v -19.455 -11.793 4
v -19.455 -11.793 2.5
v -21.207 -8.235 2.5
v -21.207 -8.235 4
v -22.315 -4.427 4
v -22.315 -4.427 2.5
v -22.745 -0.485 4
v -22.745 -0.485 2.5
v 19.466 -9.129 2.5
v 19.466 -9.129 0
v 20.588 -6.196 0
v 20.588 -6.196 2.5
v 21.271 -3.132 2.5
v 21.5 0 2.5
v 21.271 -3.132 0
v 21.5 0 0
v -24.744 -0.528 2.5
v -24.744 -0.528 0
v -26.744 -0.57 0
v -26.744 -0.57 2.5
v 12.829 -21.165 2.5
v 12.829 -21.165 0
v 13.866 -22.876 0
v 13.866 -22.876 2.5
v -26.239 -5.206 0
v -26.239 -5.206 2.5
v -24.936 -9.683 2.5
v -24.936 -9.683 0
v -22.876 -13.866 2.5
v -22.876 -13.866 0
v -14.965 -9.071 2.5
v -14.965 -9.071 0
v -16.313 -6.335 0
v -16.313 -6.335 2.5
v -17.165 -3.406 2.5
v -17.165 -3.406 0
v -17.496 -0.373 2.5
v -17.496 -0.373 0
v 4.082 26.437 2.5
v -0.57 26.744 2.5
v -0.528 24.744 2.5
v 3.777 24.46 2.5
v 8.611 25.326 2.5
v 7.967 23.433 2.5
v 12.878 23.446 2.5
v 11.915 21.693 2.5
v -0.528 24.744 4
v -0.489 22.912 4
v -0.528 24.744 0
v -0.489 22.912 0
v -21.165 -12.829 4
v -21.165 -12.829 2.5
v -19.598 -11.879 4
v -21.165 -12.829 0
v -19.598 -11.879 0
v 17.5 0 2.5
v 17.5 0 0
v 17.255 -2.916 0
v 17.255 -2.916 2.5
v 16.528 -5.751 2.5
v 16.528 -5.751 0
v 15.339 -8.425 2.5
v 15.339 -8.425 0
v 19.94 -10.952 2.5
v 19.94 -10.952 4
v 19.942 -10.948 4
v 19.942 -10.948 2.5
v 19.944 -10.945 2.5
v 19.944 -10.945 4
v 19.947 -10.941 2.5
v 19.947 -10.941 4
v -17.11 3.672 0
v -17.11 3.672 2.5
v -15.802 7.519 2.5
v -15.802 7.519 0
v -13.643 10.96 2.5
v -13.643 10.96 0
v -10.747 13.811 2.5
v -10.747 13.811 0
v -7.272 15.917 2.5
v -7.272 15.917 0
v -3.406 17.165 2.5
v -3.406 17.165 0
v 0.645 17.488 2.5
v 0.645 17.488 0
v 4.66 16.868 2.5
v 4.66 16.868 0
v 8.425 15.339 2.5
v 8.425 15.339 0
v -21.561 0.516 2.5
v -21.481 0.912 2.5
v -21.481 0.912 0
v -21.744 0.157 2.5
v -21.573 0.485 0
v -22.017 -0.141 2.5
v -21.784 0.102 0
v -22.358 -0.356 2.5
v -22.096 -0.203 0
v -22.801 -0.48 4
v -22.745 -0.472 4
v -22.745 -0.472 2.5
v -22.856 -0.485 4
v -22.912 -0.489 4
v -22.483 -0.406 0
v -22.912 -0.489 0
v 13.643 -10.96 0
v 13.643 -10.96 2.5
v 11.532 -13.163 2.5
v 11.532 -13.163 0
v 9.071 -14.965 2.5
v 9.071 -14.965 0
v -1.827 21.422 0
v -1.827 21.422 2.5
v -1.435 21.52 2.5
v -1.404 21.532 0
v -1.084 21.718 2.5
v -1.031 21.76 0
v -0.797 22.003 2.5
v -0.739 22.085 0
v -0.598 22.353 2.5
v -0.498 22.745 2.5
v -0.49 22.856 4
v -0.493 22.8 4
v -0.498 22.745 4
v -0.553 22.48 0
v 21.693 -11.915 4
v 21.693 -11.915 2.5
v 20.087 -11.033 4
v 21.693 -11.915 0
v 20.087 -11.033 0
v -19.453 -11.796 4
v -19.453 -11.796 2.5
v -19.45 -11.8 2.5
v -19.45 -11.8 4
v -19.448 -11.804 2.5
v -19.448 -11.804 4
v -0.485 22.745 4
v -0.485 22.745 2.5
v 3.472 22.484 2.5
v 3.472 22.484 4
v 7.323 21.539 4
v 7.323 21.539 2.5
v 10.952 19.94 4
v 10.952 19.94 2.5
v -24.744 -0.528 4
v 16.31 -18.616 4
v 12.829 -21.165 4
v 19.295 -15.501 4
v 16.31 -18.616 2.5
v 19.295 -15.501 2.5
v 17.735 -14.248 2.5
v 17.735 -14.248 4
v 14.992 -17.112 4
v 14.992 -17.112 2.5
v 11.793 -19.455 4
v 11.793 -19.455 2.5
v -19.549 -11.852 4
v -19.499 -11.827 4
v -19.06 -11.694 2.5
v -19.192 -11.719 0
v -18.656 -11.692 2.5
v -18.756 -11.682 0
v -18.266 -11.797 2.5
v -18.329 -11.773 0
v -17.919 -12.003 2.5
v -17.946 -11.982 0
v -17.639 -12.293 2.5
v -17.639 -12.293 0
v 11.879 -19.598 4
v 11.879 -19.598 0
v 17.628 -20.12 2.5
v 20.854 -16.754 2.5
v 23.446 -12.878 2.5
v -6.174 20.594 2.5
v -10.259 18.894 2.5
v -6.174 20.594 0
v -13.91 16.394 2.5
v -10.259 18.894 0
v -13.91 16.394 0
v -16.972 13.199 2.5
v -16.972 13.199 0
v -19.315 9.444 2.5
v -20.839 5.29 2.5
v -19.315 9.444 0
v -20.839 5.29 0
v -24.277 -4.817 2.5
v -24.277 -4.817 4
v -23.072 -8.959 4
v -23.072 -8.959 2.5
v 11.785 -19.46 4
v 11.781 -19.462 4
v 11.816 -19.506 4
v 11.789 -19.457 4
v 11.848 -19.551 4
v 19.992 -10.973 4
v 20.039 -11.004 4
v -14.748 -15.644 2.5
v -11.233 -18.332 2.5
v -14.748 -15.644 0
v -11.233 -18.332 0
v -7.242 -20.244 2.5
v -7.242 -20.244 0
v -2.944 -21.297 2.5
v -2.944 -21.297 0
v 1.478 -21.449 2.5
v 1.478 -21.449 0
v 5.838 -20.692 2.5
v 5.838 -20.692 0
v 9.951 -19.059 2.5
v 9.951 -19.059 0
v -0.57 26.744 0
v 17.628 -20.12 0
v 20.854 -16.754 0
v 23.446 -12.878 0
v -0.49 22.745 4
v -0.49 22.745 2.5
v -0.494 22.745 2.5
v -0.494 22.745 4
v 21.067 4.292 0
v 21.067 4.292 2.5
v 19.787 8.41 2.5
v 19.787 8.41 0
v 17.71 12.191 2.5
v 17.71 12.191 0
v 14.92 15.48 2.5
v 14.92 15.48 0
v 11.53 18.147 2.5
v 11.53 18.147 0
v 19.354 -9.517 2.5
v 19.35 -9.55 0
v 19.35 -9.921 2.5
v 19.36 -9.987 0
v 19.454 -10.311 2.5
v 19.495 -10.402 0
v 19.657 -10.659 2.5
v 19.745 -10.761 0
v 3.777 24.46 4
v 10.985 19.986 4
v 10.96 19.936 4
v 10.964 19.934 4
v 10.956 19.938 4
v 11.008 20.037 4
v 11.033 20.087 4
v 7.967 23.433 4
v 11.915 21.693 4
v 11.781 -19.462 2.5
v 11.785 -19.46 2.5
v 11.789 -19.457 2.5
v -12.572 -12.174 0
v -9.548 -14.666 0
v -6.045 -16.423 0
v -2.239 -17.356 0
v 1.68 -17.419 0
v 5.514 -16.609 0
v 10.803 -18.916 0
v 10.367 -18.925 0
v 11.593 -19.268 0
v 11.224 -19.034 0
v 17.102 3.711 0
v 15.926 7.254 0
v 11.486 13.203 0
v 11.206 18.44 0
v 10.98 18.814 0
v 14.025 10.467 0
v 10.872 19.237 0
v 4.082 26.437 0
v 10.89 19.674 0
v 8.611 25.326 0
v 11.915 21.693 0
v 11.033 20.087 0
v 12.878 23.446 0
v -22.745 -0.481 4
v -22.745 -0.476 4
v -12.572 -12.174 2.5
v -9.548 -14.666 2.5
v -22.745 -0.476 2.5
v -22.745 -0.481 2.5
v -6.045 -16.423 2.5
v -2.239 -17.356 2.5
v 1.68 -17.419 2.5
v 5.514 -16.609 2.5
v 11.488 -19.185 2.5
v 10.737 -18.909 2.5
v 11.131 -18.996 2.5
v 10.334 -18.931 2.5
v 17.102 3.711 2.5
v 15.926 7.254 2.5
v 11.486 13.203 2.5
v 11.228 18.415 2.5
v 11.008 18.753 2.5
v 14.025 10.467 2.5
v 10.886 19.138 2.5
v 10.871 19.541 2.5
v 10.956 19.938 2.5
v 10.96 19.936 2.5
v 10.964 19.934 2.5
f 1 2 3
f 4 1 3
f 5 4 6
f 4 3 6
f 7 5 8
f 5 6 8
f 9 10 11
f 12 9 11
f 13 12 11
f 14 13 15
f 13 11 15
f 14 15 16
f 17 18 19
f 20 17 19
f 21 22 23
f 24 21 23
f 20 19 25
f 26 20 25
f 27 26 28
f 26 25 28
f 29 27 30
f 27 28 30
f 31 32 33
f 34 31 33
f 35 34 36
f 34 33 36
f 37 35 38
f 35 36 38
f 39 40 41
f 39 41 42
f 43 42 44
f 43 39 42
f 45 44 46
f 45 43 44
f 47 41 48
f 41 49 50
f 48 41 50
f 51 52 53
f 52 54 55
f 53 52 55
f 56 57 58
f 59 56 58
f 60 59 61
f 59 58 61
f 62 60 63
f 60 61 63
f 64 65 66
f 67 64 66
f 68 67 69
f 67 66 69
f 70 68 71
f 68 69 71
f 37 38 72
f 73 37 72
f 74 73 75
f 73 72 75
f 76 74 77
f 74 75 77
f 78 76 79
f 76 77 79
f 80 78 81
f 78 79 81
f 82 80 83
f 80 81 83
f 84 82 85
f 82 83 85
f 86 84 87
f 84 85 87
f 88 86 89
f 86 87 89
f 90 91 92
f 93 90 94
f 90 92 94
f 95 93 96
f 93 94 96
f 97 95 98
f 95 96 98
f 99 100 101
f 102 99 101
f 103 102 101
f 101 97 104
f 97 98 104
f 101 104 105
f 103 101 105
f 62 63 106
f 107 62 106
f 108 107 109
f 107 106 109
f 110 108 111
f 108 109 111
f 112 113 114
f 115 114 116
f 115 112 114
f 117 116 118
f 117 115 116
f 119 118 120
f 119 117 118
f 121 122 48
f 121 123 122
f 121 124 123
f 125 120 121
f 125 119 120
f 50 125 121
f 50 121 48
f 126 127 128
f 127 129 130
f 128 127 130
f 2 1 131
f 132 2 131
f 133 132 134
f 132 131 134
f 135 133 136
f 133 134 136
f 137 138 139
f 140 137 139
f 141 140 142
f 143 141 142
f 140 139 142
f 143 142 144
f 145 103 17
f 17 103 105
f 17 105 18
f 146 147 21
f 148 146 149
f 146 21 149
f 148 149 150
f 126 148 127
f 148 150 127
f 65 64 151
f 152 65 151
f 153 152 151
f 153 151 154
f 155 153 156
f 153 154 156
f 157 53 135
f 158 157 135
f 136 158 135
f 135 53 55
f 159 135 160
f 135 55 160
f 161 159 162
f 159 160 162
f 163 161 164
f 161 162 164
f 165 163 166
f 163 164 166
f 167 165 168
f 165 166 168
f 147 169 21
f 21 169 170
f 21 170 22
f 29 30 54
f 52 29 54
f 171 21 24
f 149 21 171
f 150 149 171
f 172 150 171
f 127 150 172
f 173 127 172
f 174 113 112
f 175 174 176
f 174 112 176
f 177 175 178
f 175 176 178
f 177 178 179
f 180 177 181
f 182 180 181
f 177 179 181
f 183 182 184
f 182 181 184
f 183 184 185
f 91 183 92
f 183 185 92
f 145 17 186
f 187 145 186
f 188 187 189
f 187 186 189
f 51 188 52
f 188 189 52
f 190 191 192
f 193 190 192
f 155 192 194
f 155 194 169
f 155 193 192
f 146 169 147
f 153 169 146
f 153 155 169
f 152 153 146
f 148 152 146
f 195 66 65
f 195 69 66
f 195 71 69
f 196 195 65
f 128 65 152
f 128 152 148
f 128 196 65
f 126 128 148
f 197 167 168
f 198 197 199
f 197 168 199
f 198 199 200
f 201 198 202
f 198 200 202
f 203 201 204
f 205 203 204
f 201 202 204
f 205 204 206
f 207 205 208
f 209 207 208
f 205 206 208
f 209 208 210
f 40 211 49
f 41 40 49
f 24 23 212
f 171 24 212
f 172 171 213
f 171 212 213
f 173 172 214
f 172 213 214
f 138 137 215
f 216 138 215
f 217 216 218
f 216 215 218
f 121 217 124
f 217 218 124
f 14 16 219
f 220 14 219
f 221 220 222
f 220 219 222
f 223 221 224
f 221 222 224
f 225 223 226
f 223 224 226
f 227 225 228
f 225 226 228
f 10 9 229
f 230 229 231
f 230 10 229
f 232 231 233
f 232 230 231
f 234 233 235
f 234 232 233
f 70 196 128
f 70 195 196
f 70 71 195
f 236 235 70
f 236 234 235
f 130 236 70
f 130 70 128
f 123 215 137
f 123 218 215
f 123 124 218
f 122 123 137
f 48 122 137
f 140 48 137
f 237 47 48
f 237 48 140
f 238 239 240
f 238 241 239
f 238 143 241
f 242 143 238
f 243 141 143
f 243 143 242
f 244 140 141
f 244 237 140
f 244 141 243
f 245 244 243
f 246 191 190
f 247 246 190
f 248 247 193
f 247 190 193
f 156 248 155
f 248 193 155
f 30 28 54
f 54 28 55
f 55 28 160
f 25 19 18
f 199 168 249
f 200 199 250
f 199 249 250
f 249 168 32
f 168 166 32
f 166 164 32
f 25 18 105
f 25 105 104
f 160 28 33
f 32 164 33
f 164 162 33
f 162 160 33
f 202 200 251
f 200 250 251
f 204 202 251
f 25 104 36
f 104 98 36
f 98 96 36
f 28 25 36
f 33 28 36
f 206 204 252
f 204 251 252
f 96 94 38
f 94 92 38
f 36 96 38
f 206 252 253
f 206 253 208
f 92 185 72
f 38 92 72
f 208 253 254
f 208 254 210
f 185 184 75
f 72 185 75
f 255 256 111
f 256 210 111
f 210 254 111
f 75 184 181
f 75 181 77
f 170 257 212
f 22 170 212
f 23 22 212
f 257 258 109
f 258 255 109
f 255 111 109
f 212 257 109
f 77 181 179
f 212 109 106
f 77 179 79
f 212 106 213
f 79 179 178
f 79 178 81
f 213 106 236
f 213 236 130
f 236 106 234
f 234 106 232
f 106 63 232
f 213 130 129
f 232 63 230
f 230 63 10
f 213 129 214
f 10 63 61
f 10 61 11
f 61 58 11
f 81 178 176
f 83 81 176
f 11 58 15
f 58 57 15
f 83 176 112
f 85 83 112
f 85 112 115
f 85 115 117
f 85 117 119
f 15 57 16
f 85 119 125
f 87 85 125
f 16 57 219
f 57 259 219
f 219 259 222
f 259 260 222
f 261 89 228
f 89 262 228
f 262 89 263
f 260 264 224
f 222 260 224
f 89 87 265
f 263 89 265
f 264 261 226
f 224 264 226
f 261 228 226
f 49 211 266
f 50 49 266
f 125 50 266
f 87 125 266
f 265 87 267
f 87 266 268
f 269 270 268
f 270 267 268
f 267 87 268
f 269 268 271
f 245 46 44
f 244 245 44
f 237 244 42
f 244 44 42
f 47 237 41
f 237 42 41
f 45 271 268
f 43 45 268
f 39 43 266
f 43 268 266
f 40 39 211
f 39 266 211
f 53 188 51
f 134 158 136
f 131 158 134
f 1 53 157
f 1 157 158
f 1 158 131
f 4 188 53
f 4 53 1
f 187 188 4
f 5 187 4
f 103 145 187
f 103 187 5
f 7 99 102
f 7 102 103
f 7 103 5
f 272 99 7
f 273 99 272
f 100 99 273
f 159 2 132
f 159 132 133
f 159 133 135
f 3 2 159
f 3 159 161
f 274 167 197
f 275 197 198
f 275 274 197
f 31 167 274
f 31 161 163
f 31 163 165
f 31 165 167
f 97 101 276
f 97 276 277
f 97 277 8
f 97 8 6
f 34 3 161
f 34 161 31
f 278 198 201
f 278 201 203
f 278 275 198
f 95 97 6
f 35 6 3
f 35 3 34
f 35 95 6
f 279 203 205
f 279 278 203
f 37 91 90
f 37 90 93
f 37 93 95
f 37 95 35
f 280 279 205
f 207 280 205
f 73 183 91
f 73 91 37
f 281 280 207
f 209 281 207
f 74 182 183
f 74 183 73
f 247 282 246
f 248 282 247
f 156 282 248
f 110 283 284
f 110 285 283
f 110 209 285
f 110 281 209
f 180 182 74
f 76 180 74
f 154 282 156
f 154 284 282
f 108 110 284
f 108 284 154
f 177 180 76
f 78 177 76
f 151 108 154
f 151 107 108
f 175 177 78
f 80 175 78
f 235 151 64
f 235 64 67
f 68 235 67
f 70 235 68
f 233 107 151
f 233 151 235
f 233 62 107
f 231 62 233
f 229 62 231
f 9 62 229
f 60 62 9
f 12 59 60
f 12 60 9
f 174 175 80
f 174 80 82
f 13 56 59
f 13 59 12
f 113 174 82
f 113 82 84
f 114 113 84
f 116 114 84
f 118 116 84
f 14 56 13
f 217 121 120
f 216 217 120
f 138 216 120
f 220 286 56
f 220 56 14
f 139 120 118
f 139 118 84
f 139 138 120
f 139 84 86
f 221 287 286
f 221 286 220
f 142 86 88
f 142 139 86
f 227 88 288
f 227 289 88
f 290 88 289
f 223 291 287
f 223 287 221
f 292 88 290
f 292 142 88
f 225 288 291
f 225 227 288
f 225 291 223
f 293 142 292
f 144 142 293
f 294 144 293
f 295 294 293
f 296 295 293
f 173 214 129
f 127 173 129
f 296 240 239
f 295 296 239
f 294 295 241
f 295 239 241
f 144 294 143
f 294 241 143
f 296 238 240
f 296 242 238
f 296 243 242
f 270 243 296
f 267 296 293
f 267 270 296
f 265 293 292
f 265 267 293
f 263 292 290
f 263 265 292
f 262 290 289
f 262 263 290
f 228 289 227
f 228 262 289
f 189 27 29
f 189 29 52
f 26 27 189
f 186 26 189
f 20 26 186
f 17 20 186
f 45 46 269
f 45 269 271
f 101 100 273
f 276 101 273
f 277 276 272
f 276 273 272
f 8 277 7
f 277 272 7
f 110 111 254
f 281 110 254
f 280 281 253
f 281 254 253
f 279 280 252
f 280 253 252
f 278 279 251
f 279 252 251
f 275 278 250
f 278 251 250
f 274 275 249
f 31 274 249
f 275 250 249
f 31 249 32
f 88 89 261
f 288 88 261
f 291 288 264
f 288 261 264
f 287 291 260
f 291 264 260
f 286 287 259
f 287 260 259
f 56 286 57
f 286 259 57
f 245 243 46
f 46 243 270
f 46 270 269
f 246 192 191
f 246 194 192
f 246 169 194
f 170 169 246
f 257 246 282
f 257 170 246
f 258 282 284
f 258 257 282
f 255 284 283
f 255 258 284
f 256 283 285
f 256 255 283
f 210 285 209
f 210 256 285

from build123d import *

# Parameters (mm, degrees)
F1_DEPTH     = 4
F2_DEPTH     = 2.5
F3_T3_DEPTH  = 2.5
F3_T6_DEPTH  = 6.1298487604
F3_S8_R      = 22.75
F3_T9_DEPTH  = 5
F3_T12_DEPTH = 2.5
F3_T15_DEPTH = 6.1298487604
F3_S16_R     = 22.75
F3_T17_DEPTH = 5
F3_T21_DEPTH = 2.5
F3_T24_DEPTH = 6.1298487604
F3_S25_R     = 22.75
F3_T26_DEPTH = 5
F3_T30_DEPTH = 2.5
F3_T33_DEPTH = 6.1298487604
F3_S35_R     = 22.75
F3_T36_DEPTH = 5
F3_T39_DEPTH = 2.5
F3_T42_DEPTH = 6.1298487604
F3_S44_R     = 22.75
F3_T45_DEPTH = 5
F3_T48_DEPTH = 2.5
F3_T51_DEPTH = 6.1298487604
F3_S53_R     = 22.75
F3_T54_DEPTH = 5


# Not quite as in the source:
# - a fillet or chamfer that OpenCascade refuses, or shapes differently, is made with other operations: its cross-section is extruded or revolved along the edge and cut away or added


with BuildPart() as f1:
    # F0 (on Top) → F1 (new body)
    with BuildSketch(Plane.XY):
        with BuildLine():
            Line((10.952278028, 19.9401631387), (11.9151156568, 21.6931445135))
            ThreePointArc((11.9151156568, 21.6931445135), (5.8945189879, 24.0378273956), (-0.5277794089, 24.7443720651))
            Line((-0.5277794089, 24.7443720651), (-0.4851305678, 22.7448268477))
            ThreePointArc((-0.4851305678, 22.7448268477), (5.4181942212, 22.095376697), (10.952278028, 19.9401631387))
        make_face()
    extrude(amount=F1_DEPTH)



with BuildPart() as f1b:
    # F0 (on Top) → F1, piece 2 (new body)
    with BuildSketch(Plane.XY):
        with BuildLine():
            Line((-22.7448268477, -0.4851305678), (-24.7443720651, -0.5277794089))
            ThreePointArc((-24.7443720651, -0.5277794089), (-23.7646286703, -6.9141105112), (-21.1653651046, -12.8292564083))
            Line((-21.1653651046, -12.8292564083), (-19.4550325709, -11.7925488197))
            ThreePointArc((-19.4550325709, -11.7925488197), (-21.8442546364, -6.3553945103), (-22.7448268477, -0.4851305678))
        make_face()
    extrude(amount=F1_DEPTH)


with BuildPart() as f1c:
    # F0 (on Top) → F1, piece 3 (new body)
    with BuildSketch(Plane.XY):
        with BuildLine():
            ThreePointArc((12.8292564083, -21.1653651046), (17.8701096825, -17.1237168844), (21.6931445135, -11.9151156568))
            Line((21.6931445135, -11.9151156568), (19.9401631387, -10.952278028))
            ThreePointArc((19.9401631387, -10.952278028), (16.4260604152, -15.7399821867), (11.7925488197, -19.4550325709))
            Line((11.7925488197, -19.4550325709), (12.8292564083, -21.1653651046))
        make_face()
    extrude(amount=F1_DEPTH)


with BuildPart() as f1_1:
    add(f1.part)

    add(f1b.part)  # F2 merges F1b

    add(f1c.part)  # F2 merges F1c
    # F0 (on Top) → F2 (join)
    with BuildSketch(Plane.XY):
        with BuildLine():
            Line((11.9151156568, 21.6931445135), (12.8779532856, 23.4461258884))
            ThreePointArc((12.8779532856, 23.4461258884), (6.3708437546, 25.9802780943), (-0.5704282501, 26.7439172825))
            Line((-0.5704282501, 26.7439172825), (-0.5277794089, 24.7443720651))
            ThreePointArc((-0.5277794089, 24.7443720651), (5.8945189879, 24.0378273956), (11.9151156568, 21.6931445135))
        make_face()
        with BuildLine():
            Line((-24.7443720651, -0.5277794089), (-26.7439172825, -0.5704282501))
            ThreePointArc((-26.7439172825, -0.5704282501), (-25.6850027043, -7.4728265121), (-22.8756976383, -13.8659639968))
            Line((-22.8756976383, -13.8659639968), (-21.1653651046, -12.8292564083))
            ThreePointArc((-21.1653651046, -12.8292564083), (-23.7646286703, -6.9141105112), (-24.7443720651, -0.5277794089))
        make_face()
        with BuildLine():
            ThreePointArc((13.8659639968, -22.8756976383), (19.3141589497, -18.5074515821), (23.4461258884, -12.8779532856))
            Line((23.4461258884, -12.8779532856), (21.6931445135, -11.9151156568))
            ThreePointArc((21.6931445135, -11.9151156568), (17.8701096825, -17.1237168844), (12.8292564083, -21.1653651046))
            Line((12.8292564083, -21.1653651046), (13.8659639968, -22.8756976383))
        make_face()
        with BuildLine():
            Line((8.4248292523, 15.3385870298), (10.35050451, 18.8445497794))
            ThreePointArc((10.35050451, 18.8445497794), (5.120491242, 20.8813450103), (-0.4584750421, 21.4951110868))
            Line((-0.4584750421, 21.4951110868), (-0.3731773599, 17.4960206521))
            ThreePointArc((-0.3731773599, 17.4960206521), (4.1678417086, 16.9964436131), (8.4248292523, 15.3385870298))
        make_face()
        with BuildLine():
            Line((-0.3731773599, 17.4960206521), (-0.4584750421, 21.4951110868))
            ThreePointArc((-0.4584750421, 21.4951110868), (-15.5235296231, 14.8751480006), (-21.4951110868, -0.4584750421))
            Line((-21.4951110868, -0.4584750421), (-17.4960206521, -0.3731773599))
            ThreePointArc((-17.4960206521, -0.3731773599), (-12.6354310886, 12.1076786051), (-0.3731773599, 17.4960206521))
        make_face()
        with BuildLine():
            Line((-17.4960206521, -0.3731773599), (-21.4951110868, -0.4584750421))
            ThreePointArc((-21.4951110868, -0.4584750421), (-20.6440208651, -6.0061970097), (-18.3860747373, -11.1446065769))
            Line((-18.3860747373, -11.1446065769), (-14.9654096699, -9.0711913998))
            ThreePointArc((-14.9654096699, -9.0711913998), (-16.8032727972, -4.8887650079), (-17.4960206521, -0.3731773599))
        make_face()
        with BuildLine():
            ThreePointArc((-18.3860747373, -11.1446065769), (-5.120491242, -20.8813450103), (11.1446065769, -18.3860747373))
            Line((11.1446065769, -18.3860747373), (9.0711913998, -14.9654096699))
            ThreePointArc((9.0711913998, -14.9654096699), (-4.1678417086, -16.9964436131), (-14.9654096699, -9.0711913998))
            Line((-14.9654096699, -9.0711913998), (-18.3860747373, -11.1446065769))
        make_face()
        with BuildLine():
            ThreePointArc((11.1446065769, -18.3860747373), (15.5235296231, -14.8751480006), (18.8445497794, -10.35050451))
            Line((18.8445497794, -10.35050451), (15.3385870298, -8.4248292523))
            ThreePointArc((15.3385870298, -8.4248292523), (12.6354310886, -12.1076786051), (9.0711913998, -14.9654096699))
            Line((9.0711913998, -14.9654096699), (11.1446065769, -18.3860747373))
        make_face()
        with BuildLine():
            ThreePointArc((21.5, 0), (18.5038623936, 10.9479256719), (10.35050451, 18.8445497794))
            Line((10.35050451, 18.8445497794), (8.4248292523, 15.3385870298))
            ThreePointArc((8.4248292523, 15.3385870298), (15.0612833436, 8.9111022911), (17.5, 0))
            ThreePointArc((17.5, 0), (16.9510364435, -4.3488347278), (15.3385870298, -8.4248292523))
            Line((15.3385870298, -8.4248292523), (18.8445497794, -10.35050451))
            ThreePointArc((18.8445497794, -10.35050451), (20.8255590592, -5.3428540941), (21.5, 0))
        make_face()
        with BuildLine():
            Line((-21.4951110868, -0.4584750421), (-22.7448268477, -0.4851305678))
            ThreePointArc((-22.7448268477, -0.4851305678), (-21.8442546364, -6.3553945103), (-19.4550325709, -11.7925488197))
            Line((-19.4550325709, -11.7925488197), (-18.3860747373, -11.1446065769))
            ThreePointArc((-18.3860747373, -11.1446065769), (-20.6440208651, -6.0061970097), (-21.4951110868, -0.4584750421))
        make_face()
        with BuildLine():
            ThreePointArc((11.7925488197, -19.4550325709), (16.4260604152, -15.7399821867), (19.9401631387, -10.952278028))
            Line((19.9401631387, -10.952278028), (18.8445497794, -10.35050451))
            ThreePointArc((18.8445497794, -10.35050451), (15.5235296231, -14.8751480006), (11.1446065769, -18.3860747373))
            Line((11.1446065769, -18.3860747373), (11.7925488197, -19.4550325709))
        make_face()
        with BuildLine():
            Line((10.35050451, 18.8445497794), (10.952278028, 19.9401631387))
            ThreePointArc((10.952278028, 19.9401631387), (5.4181942212, 22.095376697), (-0.4851305678, 22.7448268477))
            Line((-0.4851305678, 22.7448268477), (-0.4584750421, 21.4951110868))
            ThreePointArc((-0.4584750421, 21.4951110868), (5.120491242, 20.8813450103), (10.35050451, 18.8445497794))
        make_face()
    extrude(amount=F2_DEPTH)

    # F3: fillet of radius 1.5 on 6 edges, made by hand


with BuildPart() as f3_tool1:
    # F3_s2 → F3_t3 (new body)
    with BuildSketch(Plane.XY):
        with BuildLine():
            ThreePointArc((-19.6279317172, -11.8968828329), (-18.539917703, -11.7117398386), (-17.6192977153, -12.3204362009))
            Line((-17.6192977153, -12.3204362009), (-17.496258175, -12.2343998089))
            ThreePointArc((-17.496258175, -12.2343998089), (-17.8866718738, -11.6569137348), (-18.2576830085, -11.0667827169))
            Line((-18.2576830085, -11.0667827169), (-18.4638985973, -11.016214848))
            ThreePointArc((-18.4638985973, -11.016214848), (-19.0847234165, -11.3925240093), (-19.7057555772, -11.768491104))
            Line((-19.7057555772, -11.768491104), (-19.6279317172, -11.8968828329))
        make_face()
    extrude(amount=F3_T3_DEPTH)


with BuildPart() as f3_tool4:
    # F3_s5 → F3_t6 (new body)
    with BuildSketch(Plane.XY):
        with BuildLine():
            ThreePointArc((-19.6279317172, -11.8968828329), (-18.539917703, -11.7117398386), (-17.6192977153, -12.3204362009))
            Line((-17.6192977153, -12.3204362009), (-17.496258175, -12.2343998089))
            ThreePointArc((-17.496258175, -12.2343998089), (-17.8866718738, -11.6569137348), (-18.2576830085, -11.0667827169))
            Line((-18.2576830085, -11.0667827169), (-18.4638985973, -11.016214848))
            ThreePointArc((-18.4638985973, -11.016214848), (-19.0847234165, -11.3925240093), (-19.7057555772, -11.768491104))
            Line((-19.7057555772, -11.768491104), (-19.6279317172, -11.8968828329))
        make_face()
    extrude(amount=F3_T6_DEPTH)

    split(bisect_by=Plane.XY.offset(4), keep=Keep.BOTTOM)

    # F3_s8 → F3_t9 (cut, symmetric)
    with BuildSketch(Plane.XY.offset(3.1)):
        Circle(F3_S8_R)
    extrude(amount=F3_T9_DEPTH, both=True, mode=Mode.SUBTRACT)


with BuildPart() as f3_tool10:
    # F3_s11 → F3_t12 (new body)
    with BuildSketch(Plane.XY):
        with BuildLine():
            ThreePointArc((11.8975669659, -19.6275170342), (11.0186307447, -18.9600415346), (9.9208540079, -19.0737897628))
            Line((9.9208540079, -19.0737897628), (9.851574441, -18.9405931757))
            ThreePointArc((9.851574441, -18.9405931757), (10.4648544282, -18.6092313204), (11.0667827169, -18.2576830085))
            Line((11.0667827169, -18.2576830085), (11.2729983057, -18.3082508774))
            ThreePointArc((11.2729983057, -18.3082508774), (11.649307467, -18.9290756965), (12.0259586947, -19.5496931742))
            Line((12.0259586947, -19.5496931742), (11.8975669659, -19.6275170342))
        make_face()
    extrude(amount=F3_T12_DEPTH)


with BuildPart() as f3_tool13:
    # F3_s14 → F3_t15 (new body)
    with BuildSketch(Plane.XY):
        with BuildLine():
            ThreePointArc((11.8975669659, -19.6275170342), (11.0186307447, -18.9600415346), (9.9208540079, -19.0737897628))
            Line((9.9208540079, -19.0737897628), (9.851574441, -18.9405931757))
            ThreePointArc((9.851574441, -18.9405931757), (10.4648544282, -18.6092313204), (11.0667827169, -18.2576830085))
            Line((11.0667827169, -18.2576830085), (11.2729983057, -18.3082508774))
            ThreePointArc((11.2729983057, -18.3082508774), (11.649307467, -18.9290756965), (12.0259586947, -19.5496931742))
            Line((12.0259586947, -19.5496931742), (11.8975669659, -19.6275170342))
        make_face()
    extrude(amount=F3_T15_DEPTH)

    # F3_s16 → F3_t17 (cut, symmetric)
    with BuildSketch(Plane.XY.offset(3.1)):
        Circle(F3_S16_R)
    extrude(amount=F3_T17_DEPTH, both=True, mode=Mode.SUBTRACT)

    split(bisect_by=Plane.XY.offset(4), keep=Keep.BOTTOM)


with BuildPart() as f3_tool19:
    # F3_s20 → F3_t21 (new body)
    with BuildSketch(Plane.XY):
        with BuildLine():
            ThreePointArc((19.4794595933, -9.0985413178), (19.4126230743, -10.2001697956), (20.1169686177, -11.0498460744))
            Line((20.1169686177, -11.0498460744), (20.0446900489, -11.1814393786))
            ThreePointArc((20.0446900489, -11.1814393786), (19.4085769135, -10.8315932982), (18.7722712106, -10.4820978141))
            Line((18.7722712106, -10.4820978141), (18.7129564753, -10.2782259411))
            ThreePointArc((18.7129564753, -10.2782259411), (19.038519361, -9.6618553644), (19.3434301221, -9.0350041463))
            Line((19.3434301221, -9.0350041463), (19.4794595933, -9.0985413178))
        make_face()
    extrude(amount=F3_T21_DEPTH)


with BuildPart() as f3_tool22:
    # F3_s23 → F3_t24 (new body)
    with BuildSketch(Plane.XY):
        with BuildLine():
            ThreePointArc((19.4794595933, -9.0985413178), (19.4126230743, -10.2001697956), (20.1169686177, -11.0498460744))
            Line((20.1169686177, -11.0498460744), (20.0446900489, -11.1814393786))
            ThreePointArc((20.0446900489, -11.1814393786), (19.4085769135, -10.8315932982), (18.7722712106, -10.4820978141))
            Line((18.7722712106, -10.4820978141), (18.7129564753, -10.2782259411))
            ThreePointArc((18.7129564753, -10.2782259411), (19.038519361, -9.6618553644), (19.3434301221, -9.0350041463))
            Line((19.3434301221, -9.0350041463), (19.4794595933, -9.0985413178))
        make_face()
    extrude(amount=F3_T24_DEPTH)

    # F3_s25 → F3_t26 (cut, symmetric)
    with BuildSketch(Plane.XY.offset(3.1)):
        Circle(F3_S25_R)
    extrude(amount=F3_T26_DEPTH, both=True, mode=Mode.SUBTRACT)

    split(bisect_by=Plane.XY.offset(4), keep=Keep.BOTTOM)


with BuildPart() as f3_tool28:
    # F3_s29 → F3_t30 (new body)
    with BuildSketch(Plane.XY):
        with BuildLine():
            ThreePointArc((11.0491448819, 20.1173537527), (10.9105622534, 19.0224349072), (11.557959477, 18.1286064795))
            Line((11.557959477, 18.1286064795), (11.4772476324, 18.002010321))
            ThreePointArc((11.4772476324, 18.002010321), (10.8836398543, 18.367445442), (10.2782259411, 18.7129564753))
            Line((10.2782259411, 18.7129564753), (10.2189112058, 18.9168283483))
            ThreePointArc((10.2189112058, 18.9168283483), (10.5684066899, 19.5531340512), (10.9175515777, 20.1896323216))
            Line((10.9175515777, 20.1896323216), (11.0491448819, 20.1173537527))
        make_face()
    extrude(amount=F3_T30_DEPTH)


with BuildPart() as f3_tool31:
    # F3_s32 → F3_t33 (new body)
    with BuildSketch(Plane.XY):
        with BuildLine():
            ThreePointArc((11.0491448819, 20.1173537527), (10.9105622534, 19.0224349072), (11.557959477, 18.1286064795))
            Line((11.557959477, 18.1286064795), (11.4772476324, 18.002010321))
            ThreePointArc((11.4772476324, 18.002010321), (10.8836398543, 18.367445442), (10.2782259411, 18.7129564753))
            Line((10.2782259411, 18.7129564753), (10.2189112058, 18.9168283483))
            ThreePointArc((10.2189112058, 18.9168283483), (10.5684066899, 19.5531340512), (10.9175515777, 20.1896323216))
            Line((10.9175515777, 20.1896323216), (11.0491448819, 20.1173537527))
        make_face()
    extrude(amount=F3_T33_DEPTH)

    split(bisect_by=Plane.XY.offset(4), keep=Keep.BOTTOM)

    # F3_s35 → F3_t36 (cut, symmetric)
    with BuildSketch(Plane.XY.offset(3.1)):
        Circle(F3_S35_R)
    extrude(amount=F3_T36_DEPTH, both=True, mode=Mode.SUBTRACT)


with BuildPart() as f3_tool37:
    # F3_s38 → F3_t39 (new body)
    with BuildSketch(Plane.XY):
        with BuildLine():
            ThreePointArc((-1.8601618781, 21.4189775187), (-0.8727053713, 21.9119096342), (-0.4890369005, 22.9467289073))
            Line((-0.4890369005, 22.9467289073), (-0.3389344717, 22.9499304826))
            ThreePointArc((-0.3389344717, 22.9499304826), (-0.323853497, 22.2241173075), (-0.3083726133, 21.4983126622))
            Line((-0.3083726133, 21.4983126622), (-0.4552734668, 21.3450086581))
            ThreePointArc((-0.4552734668, 21.3450086581), (-1.1518474872, 21.3187690993), (-1.847171947, 21.2694039552))
            Line((-1.847171947, 21.2694039552), (-1.8601618781, 21.4189775187))
        make_face()
    extrude(amount=F3_T39_DEPTH)


with BuildPart() as f3_tool40:
    # F3_s41 → F3_t42 (new body)
    with BuildSketch(Plane.XY):
        with BuildLine():
            ThreePointArc((-1.8601618781, 21.4189775187), (-0.8727053713, 21.9119096342), (-0.4890369005, 22.9467289073))
            Line((-0.4890369005, 22.9467289073), (-0.3389344717, 22.9499304826))
            ThreePointArc((-0.3389344717, 22.9499304826), (-0.323853497, 22.2241173075), (-0.3083726133, 21.4983126622))
            Line((-0.3083726133, 21.4983126622), (-0.4552734668, 21.3450086581))
            ThreePointArc((-0.4552734668, 21.3450086581), (-1.1518474872, 21.3187690993), (-1.847171947, 21.2694039552))
            Line((-1.847171947, 21.2694039552), (-1.8601618781, 21.4189775187))
        make_face()
    extrude(amount=F3_T42_DEPTH)

    split(bisect_by=Plane.XY.offset(4), keep=Keep.BOTTOM)

    # F3_s44 → F3_t45 (cut, symmetric)
    with BuildSketch(Plane.XY.offset(3.1)):
        Circle(F3_S44_R)
    extrude(amount=F3_T45_DEPTH, both=True, mode=Mode.SUBTRACT)


with BuildPart() as f3_tool46:
    # F3_s47 → F3_t48 (new body)
    with BuildSketch(Plane.XY):
        with BuildLine():
            ThreePointArc((-21.4788134849, 0.9451832833), (-21.9291929982, -0.0623933726), (-22.9467118477, -0.4898367186))
            Line((-22.9467118477, -0.4898367186), (-22.9435102724, -0.6399391474))
            ThreePointArc((-22.9435102724, -0.6399391474), (-22.2177141568, -0.6240583546), (-21.4919095115, -0.6085774709))
            Line((-21.4919095115, -0.6085774709), (-21.3450086581, -0.4552734668))
            ThreePointArc((-21.3450086581, -0.4552734668), (-21.3484942825, 0.2417858785), (-21.3288220733, 0.9385828547))
            Line((-21.3288220733, 0.9385828547), (-21.4788134849, 0.9451832833))
        make_face()
    extrude(amount=F3_T48_DEPTH)


with BuildPart() as f3_tool49:
    # F3_s50 → F3_t51 (new body)
    with BuildSketch(Plane.XY):
        with BuildLine():
            ThreePointArc((-21.4788134849, 0.9451832833), (-21.9291929982, -0.0623933726), (-22.9467118477, -0.4898367186))
            Line((-22.9467118477, -0.4898367186), (-22.9435102724, -0.6399391474))
            ThreePointArc((-22.9435102724, -0.6399391474), (-22.2177141568, -0.6240583546), (-21.4919095115, -0.6085774709))
            Line((-21.4919095115, -0.6085774709), (-21.3450086581, -0.4552734668))
            ThreePointArc((-21.3450086581, -0.4552734668), (-21.3484942825, 0.2417858785), (-21.3288220733, 0.9385828547))
            Line((-21.3288220733, 0.9385828547), (-21.4788134849, 0.9451832833))
        make_face()
    extrude(amount=F3_T51_DEPTH)

    split(bisect_by=Plane.XY.offset(4), keep=Keep.BOTTOM)

    # F3_s53 → F3_t54 (cut, symmetric)
    with BuildSketch(Plane.XY.offset(3.1)):
        Circle(F3_S53_R)
    extrude(amount=F3_T54_DEPTH, both=True, mode=Mode.SUBTRACT)


with BuildPart() as f1_2:
    add(f1_1.part)

    # F3_t55: union F3_tool1, F3_tool4, F3_tool10, F3_tool13, F3_tool19, F3_tool22, F3_tool28, F3_tool31, F3_tool37, F3_tool40, F3_tool46, F3_tool49
    add([f3_tool1.part, f3_tool4.part, f3_tool10.part, f3_tool13.part, f3_tool19.part, f3_tool22.part, f3_tool28.part, f3_tool31.part, f3_tool37.part, f3_tool40.part, f3_tool46.part, f3_tool49.part])


solid = f1_2.part
